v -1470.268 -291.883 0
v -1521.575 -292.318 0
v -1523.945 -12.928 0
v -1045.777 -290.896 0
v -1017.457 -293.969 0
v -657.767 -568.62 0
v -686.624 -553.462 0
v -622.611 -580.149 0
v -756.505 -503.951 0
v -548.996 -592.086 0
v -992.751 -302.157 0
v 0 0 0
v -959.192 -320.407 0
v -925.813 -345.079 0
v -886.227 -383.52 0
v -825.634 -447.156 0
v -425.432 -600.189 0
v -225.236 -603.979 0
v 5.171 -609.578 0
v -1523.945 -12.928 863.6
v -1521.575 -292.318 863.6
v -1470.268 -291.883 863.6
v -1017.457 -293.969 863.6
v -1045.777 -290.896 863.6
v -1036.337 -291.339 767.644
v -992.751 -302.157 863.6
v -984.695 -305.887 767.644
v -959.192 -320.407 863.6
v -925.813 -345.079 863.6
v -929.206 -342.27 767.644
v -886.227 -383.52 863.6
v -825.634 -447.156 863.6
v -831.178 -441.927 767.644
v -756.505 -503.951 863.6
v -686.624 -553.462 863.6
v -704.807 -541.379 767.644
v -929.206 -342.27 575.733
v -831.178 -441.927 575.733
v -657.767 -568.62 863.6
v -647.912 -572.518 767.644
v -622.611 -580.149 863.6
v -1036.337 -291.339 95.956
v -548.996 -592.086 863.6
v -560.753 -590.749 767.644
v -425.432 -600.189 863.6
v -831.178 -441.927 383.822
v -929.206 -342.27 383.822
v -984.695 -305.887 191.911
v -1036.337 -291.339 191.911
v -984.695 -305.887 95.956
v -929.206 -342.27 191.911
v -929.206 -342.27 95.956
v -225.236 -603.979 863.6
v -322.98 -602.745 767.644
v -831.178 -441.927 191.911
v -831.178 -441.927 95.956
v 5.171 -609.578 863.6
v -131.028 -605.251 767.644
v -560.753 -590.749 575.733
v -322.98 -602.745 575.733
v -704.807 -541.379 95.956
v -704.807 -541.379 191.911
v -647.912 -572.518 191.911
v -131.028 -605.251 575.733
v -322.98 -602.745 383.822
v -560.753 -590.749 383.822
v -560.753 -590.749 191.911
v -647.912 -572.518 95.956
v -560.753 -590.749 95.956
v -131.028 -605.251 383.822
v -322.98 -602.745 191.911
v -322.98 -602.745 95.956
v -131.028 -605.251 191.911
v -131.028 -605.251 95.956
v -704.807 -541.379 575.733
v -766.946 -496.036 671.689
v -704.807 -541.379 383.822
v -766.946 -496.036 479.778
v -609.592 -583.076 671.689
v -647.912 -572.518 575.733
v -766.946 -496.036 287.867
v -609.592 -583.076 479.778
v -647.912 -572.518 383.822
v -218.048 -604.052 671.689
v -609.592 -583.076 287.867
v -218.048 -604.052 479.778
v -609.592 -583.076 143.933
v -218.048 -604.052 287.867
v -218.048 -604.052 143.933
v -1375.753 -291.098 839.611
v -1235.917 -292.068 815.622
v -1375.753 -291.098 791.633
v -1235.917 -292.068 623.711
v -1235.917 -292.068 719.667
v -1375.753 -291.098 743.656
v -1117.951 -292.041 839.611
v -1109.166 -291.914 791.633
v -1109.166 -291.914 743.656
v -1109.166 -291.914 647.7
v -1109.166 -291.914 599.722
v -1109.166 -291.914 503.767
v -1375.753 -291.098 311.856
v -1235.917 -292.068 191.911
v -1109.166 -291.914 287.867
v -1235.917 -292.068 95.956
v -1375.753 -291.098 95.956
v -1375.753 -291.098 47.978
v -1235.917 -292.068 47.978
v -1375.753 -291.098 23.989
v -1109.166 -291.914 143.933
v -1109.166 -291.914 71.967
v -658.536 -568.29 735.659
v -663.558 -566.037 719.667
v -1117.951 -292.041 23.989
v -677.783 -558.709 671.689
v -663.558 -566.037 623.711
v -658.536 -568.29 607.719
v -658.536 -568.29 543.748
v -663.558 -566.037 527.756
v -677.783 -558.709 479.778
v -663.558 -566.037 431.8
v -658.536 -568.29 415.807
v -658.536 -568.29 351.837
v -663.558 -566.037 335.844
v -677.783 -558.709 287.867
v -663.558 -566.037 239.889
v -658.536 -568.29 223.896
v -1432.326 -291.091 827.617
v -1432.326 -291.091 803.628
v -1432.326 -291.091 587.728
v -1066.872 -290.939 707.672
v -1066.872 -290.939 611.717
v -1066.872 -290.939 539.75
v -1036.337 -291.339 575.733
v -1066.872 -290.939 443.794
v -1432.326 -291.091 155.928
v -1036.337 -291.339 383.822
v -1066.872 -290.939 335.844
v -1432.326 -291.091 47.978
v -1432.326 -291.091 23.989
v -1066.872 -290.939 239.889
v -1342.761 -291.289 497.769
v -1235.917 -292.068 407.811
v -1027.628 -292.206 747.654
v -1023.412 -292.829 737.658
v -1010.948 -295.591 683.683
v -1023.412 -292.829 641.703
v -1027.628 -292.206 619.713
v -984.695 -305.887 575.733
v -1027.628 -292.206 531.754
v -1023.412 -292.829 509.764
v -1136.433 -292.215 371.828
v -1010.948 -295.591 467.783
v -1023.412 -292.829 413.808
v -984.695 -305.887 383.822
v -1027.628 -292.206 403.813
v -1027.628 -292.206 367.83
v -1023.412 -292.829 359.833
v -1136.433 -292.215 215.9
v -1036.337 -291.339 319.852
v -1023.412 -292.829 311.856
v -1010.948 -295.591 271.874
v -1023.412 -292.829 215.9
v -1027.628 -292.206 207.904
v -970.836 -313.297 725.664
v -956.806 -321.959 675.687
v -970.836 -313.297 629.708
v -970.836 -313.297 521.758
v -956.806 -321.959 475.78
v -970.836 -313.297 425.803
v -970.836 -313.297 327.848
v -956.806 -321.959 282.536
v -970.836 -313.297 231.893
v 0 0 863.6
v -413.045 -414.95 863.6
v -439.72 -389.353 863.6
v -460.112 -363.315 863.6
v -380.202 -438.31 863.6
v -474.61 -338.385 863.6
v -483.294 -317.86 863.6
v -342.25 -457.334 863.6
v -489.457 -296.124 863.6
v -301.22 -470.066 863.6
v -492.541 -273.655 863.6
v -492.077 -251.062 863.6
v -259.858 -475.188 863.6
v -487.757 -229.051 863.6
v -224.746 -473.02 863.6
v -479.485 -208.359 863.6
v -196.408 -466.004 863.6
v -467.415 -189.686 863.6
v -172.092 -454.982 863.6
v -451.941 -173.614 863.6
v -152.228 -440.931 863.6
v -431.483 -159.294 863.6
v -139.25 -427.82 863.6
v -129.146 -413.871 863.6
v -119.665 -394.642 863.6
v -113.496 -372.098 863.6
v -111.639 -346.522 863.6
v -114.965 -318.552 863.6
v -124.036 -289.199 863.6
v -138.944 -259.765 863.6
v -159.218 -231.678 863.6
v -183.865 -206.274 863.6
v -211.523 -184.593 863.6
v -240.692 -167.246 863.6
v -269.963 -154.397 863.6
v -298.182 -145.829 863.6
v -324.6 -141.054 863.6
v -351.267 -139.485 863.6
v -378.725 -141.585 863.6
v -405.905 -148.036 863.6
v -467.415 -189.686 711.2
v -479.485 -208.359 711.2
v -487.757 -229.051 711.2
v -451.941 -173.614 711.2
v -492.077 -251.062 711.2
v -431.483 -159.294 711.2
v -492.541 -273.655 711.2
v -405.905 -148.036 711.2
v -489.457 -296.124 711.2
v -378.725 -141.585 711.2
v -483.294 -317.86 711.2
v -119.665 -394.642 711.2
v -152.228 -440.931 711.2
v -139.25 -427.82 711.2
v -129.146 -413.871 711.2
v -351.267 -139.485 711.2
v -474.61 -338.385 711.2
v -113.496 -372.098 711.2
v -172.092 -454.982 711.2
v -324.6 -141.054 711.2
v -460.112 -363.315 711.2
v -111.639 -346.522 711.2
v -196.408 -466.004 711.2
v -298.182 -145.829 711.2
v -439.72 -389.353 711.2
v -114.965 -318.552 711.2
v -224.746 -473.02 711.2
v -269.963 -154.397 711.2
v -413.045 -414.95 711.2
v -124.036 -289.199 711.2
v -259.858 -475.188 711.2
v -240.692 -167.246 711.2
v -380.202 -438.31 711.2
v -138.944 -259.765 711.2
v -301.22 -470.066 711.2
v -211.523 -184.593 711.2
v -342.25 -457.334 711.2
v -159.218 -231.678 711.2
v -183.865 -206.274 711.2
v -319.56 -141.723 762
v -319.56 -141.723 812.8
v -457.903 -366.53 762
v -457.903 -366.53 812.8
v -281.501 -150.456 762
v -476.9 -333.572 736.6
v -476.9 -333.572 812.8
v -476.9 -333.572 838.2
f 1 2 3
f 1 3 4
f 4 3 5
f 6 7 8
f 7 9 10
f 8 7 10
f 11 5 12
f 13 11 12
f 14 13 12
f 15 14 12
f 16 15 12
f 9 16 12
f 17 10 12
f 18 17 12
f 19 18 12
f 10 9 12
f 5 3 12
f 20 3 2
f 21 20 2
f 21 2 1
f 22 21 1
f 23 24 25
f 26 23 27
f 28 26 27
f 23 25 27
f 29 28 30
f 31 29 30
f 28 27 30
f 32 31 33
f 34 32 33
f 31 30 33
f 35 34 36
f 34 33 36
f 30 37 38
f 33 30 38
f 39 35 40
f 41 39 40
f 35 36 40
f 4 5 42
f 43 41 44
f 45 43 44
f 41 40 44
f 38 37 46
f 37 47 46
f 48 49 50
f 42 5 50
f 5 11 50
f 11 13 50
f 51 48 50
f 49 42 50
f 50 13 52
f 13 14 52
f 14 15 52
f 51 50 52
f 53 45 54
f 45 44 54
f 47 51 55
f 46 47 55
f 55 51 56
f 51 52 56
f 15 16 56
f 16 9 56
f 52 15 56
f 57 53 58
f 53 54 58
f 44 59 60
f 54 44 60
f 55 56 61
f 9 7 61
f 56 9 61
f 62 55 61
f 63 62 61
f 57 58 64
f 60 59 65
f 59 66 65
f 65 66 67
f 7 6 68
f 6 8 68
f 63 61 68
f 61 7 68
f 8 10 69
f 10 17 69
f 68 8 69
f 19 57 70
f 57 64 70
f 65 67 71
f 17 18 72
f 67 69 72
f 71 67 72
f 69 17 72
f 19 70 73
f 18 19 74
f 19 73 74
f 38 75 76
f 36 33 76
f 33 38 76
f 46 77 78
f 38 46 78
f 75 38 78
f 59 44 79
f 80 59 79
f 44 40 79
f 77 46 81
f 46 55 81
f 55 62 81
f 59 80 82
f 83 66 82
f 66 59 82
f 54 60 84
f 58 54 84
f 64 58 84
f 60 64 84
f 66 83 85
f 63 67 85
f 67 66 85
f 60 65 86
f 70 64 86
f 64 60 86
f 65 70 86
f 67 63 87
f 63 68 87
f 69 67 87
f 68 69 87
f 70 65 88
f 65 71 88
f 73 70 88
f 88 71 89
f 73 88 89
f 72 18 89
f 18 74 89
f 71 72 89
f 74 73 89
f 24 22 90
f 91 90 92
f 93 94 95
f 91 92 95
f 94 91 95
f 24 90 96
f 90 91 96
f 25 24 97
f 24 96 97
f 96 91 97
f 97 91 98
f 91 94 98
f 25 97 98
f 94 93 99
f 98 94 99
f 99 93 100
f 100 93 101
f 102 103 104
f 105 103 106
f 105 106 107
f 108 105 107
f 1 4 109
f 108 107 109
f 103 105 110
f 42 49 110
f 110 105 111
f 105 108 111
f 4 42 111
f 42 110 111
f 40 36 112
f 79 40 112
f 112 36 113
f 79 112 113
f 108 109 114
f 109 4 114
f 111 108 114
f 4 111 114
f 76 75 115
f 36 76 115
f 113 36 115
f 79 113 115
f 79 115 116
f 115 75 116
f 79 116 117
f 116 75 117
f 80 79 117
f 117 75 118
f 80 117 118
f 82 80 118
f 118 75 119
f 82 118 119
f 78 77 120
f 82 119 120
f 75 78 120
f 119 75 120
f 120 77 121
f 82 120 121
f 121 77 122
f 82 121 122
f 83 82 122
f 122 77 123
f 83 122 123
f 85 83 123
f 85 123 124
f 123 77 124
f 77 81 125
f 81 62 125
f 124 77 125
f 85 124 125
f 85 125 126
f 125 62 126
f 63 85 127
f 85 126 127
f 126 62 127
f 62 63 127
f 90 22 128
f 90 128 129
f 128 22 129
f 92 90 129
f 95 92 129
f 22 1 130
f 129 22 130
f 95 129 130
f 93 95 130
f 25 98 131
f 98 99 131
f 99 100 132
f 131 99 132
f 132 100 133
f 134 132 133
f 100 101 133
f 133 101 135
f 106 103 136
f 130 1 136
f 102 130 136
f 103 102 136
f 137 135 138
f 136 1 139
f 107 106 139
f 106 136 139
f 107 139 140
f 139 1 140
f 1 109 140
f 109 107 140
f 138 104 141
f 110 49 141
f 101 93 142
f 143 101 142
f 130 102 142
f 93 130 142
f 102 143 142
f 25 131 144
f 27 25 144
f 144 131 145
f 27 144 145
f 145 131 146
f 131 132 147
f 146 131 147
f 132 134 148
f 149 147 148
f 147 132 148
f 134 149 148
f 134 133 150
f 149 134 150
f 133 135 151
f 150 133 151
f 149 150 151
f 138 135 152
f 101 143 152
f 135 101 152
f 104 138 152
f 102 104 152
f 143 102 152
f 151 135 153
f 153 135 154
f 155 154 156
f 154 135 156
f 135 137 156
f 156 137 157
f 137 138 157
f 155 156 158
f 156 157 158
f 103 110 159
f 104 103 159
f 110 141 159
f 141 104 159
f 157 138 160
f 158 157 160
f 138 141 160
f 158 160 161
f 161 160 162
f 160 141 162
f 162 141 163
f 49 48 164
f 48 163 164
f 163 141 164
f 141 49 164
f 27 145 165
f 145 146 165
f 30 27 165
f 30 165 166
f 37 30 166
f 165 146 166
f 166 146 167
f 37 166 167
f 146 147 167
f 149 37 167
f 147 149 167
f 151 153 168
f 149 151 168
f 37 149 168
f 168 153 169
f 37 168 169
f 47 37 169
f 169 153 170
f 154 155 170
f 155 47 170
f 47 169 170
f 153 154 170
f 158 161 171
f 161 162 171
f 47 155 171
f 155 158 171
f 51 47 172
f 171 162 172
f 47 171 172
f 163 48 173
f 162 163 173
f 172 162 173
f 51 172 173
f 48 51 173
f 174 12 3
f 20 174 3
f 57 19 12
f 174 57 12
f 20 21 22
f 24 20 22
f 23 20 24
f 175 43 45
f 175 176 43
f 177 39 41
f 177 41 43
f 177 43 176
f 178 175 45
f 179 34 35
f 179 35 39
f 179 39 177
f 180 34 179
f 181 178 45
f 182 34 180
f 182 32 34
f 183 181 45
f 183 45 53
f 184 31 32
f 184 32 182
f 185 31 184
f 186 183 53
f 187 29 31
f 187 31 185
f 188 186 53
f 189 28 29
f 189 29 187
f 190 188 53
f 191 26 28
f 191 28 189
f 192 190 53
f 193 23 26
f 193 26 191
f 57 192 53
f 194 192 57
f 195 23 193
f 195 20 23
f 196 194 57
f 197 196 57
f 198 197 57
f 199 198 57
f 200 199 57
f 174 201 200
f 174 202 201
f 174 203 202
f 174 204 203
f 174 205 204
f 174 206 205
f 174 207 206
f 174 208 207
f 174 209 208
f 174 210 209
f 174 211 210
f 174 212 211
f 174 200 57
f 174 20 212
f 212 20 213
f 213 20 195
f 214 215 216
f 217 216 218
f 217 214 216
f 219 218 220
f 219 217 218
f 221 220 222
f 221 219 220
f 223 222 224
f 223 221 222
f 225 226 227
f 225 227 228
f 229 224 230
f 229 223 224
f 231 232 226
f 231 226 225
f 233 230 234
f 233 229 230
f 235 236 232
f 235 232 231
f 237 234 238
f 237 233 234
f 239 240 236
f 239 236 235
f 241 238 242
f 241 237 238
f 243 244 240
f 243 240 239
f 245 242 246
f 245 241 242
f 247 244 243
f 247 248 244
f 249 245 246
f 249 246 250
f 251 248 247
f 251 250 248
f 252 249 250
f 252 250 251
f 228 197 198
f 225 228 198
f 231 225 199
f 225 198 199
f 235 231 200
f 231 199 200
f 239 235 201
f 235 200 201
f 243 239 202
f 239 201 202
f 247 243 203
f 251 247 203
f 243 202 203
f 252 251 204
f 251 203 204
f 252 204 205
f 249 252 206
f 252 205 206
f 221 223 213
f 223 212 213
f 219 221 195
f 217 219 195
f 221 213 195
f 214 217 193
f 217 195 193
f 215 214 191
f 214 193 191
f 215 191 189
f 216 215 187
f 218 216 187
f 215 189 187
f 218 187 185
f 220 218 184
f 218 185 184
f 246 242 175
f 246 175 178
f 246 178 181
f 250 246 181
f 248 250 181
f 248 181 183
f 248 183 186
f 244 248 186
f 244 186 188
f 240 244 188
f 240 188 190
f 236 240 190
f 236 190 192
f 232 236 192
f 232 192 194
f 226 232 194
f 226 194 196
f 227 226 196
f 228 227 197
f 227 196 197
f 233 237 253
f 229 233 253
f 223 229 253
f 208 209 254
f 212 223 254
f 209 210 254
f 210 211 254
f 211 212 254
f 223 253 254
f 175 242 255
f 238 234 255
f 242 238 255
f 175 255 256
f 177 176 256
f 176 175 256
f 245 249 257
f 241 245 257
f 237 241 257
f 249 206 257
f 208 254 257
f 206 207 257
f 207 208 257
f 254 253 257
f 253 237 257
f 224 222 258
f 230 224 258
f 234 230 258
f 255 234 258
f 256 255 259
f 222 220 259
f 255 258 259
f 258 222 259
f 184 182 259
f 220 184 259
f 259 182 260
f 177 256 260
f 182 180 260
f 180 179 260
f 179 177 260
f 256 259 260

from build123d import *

# Parameters (mm, degrees)
F1_DEPTH = 863.6
F3_DEPTH = 152.4


with BuildPart() as f1:
    # F0 (on Top) → F1 (new body)
    with BuildSketch(Plane.XY):
        with BuildLine():
            Line((5.1712791552, -609.5780654452), (0, 0))
            Line((0, 0), (-1523.945163613, -12.9281978881))
            Line((-1523.945163613, -12.9281978881), (-1521.5749940002, -292.3181445505))
            Line((-1521.5749940002, -292.3181445505), (-1470.267745312, -291.8828859336))
            add(Edge.make_bspline(
                [(-1470.267745312, -291.8828859336), (-1417.5702780767, -289.2463226551), (-1095.5111979406, -295.9816219873), (-1009.8644785837, -285.5675139686), (-908.1150816583, -351.6452825618), (-837.6932292983, -445.1648141807), (-712.3005781961, -536.8126968936), (-628.5880833926, -594.1331007539), (-339.4123112672, -603.9797790496), (-131.2186034217, -604.0444126029), (-49.0435831404, -607.9862117262), (5.1712791552, -609.5780654452)],
                knots=[0, 0, 0, 0, 0.1645442885, 0.2521608346, 0.3403282662, 0.4361793801, 0.5413406025, 0.6281413427, 0.7734172402, 0.8991700782, 1, 1, 1, 1], degree=3))
        make_face()
    extrude(amount=F1_DEPTH)

    # F2 (on face) → F3 (cut)
    with BuildSketch(Plane.XY.offset(863.6)):
        with BuildLine():
            add(Edge.make_bspline(
                [(-129.1464435727, -413.8713023162), (9.1967369441, -189.0637303697), (-319.5602776727, -141.722571319), (-648.3172922894, -94.3814122683), (-457.9034581895, -366.5301432655), (-267.4896240896, -638.6788742627), (-129.1464435727, -413.8713023162)],
                knots=[0, 0, 0, 2.0943951024, 2.0943951024, 4.1887902048, 4.1887902048, 6.2831853072, 6.2831853072, 6.2831853072], degree=2, weights=[1, 0.5, 1, 0.5, 1, 0.5, 1]))
        make_face()
    extrude(amount=-F3_DEPTH, mode=Mode.SUBTRACT)


solid = f1.part
